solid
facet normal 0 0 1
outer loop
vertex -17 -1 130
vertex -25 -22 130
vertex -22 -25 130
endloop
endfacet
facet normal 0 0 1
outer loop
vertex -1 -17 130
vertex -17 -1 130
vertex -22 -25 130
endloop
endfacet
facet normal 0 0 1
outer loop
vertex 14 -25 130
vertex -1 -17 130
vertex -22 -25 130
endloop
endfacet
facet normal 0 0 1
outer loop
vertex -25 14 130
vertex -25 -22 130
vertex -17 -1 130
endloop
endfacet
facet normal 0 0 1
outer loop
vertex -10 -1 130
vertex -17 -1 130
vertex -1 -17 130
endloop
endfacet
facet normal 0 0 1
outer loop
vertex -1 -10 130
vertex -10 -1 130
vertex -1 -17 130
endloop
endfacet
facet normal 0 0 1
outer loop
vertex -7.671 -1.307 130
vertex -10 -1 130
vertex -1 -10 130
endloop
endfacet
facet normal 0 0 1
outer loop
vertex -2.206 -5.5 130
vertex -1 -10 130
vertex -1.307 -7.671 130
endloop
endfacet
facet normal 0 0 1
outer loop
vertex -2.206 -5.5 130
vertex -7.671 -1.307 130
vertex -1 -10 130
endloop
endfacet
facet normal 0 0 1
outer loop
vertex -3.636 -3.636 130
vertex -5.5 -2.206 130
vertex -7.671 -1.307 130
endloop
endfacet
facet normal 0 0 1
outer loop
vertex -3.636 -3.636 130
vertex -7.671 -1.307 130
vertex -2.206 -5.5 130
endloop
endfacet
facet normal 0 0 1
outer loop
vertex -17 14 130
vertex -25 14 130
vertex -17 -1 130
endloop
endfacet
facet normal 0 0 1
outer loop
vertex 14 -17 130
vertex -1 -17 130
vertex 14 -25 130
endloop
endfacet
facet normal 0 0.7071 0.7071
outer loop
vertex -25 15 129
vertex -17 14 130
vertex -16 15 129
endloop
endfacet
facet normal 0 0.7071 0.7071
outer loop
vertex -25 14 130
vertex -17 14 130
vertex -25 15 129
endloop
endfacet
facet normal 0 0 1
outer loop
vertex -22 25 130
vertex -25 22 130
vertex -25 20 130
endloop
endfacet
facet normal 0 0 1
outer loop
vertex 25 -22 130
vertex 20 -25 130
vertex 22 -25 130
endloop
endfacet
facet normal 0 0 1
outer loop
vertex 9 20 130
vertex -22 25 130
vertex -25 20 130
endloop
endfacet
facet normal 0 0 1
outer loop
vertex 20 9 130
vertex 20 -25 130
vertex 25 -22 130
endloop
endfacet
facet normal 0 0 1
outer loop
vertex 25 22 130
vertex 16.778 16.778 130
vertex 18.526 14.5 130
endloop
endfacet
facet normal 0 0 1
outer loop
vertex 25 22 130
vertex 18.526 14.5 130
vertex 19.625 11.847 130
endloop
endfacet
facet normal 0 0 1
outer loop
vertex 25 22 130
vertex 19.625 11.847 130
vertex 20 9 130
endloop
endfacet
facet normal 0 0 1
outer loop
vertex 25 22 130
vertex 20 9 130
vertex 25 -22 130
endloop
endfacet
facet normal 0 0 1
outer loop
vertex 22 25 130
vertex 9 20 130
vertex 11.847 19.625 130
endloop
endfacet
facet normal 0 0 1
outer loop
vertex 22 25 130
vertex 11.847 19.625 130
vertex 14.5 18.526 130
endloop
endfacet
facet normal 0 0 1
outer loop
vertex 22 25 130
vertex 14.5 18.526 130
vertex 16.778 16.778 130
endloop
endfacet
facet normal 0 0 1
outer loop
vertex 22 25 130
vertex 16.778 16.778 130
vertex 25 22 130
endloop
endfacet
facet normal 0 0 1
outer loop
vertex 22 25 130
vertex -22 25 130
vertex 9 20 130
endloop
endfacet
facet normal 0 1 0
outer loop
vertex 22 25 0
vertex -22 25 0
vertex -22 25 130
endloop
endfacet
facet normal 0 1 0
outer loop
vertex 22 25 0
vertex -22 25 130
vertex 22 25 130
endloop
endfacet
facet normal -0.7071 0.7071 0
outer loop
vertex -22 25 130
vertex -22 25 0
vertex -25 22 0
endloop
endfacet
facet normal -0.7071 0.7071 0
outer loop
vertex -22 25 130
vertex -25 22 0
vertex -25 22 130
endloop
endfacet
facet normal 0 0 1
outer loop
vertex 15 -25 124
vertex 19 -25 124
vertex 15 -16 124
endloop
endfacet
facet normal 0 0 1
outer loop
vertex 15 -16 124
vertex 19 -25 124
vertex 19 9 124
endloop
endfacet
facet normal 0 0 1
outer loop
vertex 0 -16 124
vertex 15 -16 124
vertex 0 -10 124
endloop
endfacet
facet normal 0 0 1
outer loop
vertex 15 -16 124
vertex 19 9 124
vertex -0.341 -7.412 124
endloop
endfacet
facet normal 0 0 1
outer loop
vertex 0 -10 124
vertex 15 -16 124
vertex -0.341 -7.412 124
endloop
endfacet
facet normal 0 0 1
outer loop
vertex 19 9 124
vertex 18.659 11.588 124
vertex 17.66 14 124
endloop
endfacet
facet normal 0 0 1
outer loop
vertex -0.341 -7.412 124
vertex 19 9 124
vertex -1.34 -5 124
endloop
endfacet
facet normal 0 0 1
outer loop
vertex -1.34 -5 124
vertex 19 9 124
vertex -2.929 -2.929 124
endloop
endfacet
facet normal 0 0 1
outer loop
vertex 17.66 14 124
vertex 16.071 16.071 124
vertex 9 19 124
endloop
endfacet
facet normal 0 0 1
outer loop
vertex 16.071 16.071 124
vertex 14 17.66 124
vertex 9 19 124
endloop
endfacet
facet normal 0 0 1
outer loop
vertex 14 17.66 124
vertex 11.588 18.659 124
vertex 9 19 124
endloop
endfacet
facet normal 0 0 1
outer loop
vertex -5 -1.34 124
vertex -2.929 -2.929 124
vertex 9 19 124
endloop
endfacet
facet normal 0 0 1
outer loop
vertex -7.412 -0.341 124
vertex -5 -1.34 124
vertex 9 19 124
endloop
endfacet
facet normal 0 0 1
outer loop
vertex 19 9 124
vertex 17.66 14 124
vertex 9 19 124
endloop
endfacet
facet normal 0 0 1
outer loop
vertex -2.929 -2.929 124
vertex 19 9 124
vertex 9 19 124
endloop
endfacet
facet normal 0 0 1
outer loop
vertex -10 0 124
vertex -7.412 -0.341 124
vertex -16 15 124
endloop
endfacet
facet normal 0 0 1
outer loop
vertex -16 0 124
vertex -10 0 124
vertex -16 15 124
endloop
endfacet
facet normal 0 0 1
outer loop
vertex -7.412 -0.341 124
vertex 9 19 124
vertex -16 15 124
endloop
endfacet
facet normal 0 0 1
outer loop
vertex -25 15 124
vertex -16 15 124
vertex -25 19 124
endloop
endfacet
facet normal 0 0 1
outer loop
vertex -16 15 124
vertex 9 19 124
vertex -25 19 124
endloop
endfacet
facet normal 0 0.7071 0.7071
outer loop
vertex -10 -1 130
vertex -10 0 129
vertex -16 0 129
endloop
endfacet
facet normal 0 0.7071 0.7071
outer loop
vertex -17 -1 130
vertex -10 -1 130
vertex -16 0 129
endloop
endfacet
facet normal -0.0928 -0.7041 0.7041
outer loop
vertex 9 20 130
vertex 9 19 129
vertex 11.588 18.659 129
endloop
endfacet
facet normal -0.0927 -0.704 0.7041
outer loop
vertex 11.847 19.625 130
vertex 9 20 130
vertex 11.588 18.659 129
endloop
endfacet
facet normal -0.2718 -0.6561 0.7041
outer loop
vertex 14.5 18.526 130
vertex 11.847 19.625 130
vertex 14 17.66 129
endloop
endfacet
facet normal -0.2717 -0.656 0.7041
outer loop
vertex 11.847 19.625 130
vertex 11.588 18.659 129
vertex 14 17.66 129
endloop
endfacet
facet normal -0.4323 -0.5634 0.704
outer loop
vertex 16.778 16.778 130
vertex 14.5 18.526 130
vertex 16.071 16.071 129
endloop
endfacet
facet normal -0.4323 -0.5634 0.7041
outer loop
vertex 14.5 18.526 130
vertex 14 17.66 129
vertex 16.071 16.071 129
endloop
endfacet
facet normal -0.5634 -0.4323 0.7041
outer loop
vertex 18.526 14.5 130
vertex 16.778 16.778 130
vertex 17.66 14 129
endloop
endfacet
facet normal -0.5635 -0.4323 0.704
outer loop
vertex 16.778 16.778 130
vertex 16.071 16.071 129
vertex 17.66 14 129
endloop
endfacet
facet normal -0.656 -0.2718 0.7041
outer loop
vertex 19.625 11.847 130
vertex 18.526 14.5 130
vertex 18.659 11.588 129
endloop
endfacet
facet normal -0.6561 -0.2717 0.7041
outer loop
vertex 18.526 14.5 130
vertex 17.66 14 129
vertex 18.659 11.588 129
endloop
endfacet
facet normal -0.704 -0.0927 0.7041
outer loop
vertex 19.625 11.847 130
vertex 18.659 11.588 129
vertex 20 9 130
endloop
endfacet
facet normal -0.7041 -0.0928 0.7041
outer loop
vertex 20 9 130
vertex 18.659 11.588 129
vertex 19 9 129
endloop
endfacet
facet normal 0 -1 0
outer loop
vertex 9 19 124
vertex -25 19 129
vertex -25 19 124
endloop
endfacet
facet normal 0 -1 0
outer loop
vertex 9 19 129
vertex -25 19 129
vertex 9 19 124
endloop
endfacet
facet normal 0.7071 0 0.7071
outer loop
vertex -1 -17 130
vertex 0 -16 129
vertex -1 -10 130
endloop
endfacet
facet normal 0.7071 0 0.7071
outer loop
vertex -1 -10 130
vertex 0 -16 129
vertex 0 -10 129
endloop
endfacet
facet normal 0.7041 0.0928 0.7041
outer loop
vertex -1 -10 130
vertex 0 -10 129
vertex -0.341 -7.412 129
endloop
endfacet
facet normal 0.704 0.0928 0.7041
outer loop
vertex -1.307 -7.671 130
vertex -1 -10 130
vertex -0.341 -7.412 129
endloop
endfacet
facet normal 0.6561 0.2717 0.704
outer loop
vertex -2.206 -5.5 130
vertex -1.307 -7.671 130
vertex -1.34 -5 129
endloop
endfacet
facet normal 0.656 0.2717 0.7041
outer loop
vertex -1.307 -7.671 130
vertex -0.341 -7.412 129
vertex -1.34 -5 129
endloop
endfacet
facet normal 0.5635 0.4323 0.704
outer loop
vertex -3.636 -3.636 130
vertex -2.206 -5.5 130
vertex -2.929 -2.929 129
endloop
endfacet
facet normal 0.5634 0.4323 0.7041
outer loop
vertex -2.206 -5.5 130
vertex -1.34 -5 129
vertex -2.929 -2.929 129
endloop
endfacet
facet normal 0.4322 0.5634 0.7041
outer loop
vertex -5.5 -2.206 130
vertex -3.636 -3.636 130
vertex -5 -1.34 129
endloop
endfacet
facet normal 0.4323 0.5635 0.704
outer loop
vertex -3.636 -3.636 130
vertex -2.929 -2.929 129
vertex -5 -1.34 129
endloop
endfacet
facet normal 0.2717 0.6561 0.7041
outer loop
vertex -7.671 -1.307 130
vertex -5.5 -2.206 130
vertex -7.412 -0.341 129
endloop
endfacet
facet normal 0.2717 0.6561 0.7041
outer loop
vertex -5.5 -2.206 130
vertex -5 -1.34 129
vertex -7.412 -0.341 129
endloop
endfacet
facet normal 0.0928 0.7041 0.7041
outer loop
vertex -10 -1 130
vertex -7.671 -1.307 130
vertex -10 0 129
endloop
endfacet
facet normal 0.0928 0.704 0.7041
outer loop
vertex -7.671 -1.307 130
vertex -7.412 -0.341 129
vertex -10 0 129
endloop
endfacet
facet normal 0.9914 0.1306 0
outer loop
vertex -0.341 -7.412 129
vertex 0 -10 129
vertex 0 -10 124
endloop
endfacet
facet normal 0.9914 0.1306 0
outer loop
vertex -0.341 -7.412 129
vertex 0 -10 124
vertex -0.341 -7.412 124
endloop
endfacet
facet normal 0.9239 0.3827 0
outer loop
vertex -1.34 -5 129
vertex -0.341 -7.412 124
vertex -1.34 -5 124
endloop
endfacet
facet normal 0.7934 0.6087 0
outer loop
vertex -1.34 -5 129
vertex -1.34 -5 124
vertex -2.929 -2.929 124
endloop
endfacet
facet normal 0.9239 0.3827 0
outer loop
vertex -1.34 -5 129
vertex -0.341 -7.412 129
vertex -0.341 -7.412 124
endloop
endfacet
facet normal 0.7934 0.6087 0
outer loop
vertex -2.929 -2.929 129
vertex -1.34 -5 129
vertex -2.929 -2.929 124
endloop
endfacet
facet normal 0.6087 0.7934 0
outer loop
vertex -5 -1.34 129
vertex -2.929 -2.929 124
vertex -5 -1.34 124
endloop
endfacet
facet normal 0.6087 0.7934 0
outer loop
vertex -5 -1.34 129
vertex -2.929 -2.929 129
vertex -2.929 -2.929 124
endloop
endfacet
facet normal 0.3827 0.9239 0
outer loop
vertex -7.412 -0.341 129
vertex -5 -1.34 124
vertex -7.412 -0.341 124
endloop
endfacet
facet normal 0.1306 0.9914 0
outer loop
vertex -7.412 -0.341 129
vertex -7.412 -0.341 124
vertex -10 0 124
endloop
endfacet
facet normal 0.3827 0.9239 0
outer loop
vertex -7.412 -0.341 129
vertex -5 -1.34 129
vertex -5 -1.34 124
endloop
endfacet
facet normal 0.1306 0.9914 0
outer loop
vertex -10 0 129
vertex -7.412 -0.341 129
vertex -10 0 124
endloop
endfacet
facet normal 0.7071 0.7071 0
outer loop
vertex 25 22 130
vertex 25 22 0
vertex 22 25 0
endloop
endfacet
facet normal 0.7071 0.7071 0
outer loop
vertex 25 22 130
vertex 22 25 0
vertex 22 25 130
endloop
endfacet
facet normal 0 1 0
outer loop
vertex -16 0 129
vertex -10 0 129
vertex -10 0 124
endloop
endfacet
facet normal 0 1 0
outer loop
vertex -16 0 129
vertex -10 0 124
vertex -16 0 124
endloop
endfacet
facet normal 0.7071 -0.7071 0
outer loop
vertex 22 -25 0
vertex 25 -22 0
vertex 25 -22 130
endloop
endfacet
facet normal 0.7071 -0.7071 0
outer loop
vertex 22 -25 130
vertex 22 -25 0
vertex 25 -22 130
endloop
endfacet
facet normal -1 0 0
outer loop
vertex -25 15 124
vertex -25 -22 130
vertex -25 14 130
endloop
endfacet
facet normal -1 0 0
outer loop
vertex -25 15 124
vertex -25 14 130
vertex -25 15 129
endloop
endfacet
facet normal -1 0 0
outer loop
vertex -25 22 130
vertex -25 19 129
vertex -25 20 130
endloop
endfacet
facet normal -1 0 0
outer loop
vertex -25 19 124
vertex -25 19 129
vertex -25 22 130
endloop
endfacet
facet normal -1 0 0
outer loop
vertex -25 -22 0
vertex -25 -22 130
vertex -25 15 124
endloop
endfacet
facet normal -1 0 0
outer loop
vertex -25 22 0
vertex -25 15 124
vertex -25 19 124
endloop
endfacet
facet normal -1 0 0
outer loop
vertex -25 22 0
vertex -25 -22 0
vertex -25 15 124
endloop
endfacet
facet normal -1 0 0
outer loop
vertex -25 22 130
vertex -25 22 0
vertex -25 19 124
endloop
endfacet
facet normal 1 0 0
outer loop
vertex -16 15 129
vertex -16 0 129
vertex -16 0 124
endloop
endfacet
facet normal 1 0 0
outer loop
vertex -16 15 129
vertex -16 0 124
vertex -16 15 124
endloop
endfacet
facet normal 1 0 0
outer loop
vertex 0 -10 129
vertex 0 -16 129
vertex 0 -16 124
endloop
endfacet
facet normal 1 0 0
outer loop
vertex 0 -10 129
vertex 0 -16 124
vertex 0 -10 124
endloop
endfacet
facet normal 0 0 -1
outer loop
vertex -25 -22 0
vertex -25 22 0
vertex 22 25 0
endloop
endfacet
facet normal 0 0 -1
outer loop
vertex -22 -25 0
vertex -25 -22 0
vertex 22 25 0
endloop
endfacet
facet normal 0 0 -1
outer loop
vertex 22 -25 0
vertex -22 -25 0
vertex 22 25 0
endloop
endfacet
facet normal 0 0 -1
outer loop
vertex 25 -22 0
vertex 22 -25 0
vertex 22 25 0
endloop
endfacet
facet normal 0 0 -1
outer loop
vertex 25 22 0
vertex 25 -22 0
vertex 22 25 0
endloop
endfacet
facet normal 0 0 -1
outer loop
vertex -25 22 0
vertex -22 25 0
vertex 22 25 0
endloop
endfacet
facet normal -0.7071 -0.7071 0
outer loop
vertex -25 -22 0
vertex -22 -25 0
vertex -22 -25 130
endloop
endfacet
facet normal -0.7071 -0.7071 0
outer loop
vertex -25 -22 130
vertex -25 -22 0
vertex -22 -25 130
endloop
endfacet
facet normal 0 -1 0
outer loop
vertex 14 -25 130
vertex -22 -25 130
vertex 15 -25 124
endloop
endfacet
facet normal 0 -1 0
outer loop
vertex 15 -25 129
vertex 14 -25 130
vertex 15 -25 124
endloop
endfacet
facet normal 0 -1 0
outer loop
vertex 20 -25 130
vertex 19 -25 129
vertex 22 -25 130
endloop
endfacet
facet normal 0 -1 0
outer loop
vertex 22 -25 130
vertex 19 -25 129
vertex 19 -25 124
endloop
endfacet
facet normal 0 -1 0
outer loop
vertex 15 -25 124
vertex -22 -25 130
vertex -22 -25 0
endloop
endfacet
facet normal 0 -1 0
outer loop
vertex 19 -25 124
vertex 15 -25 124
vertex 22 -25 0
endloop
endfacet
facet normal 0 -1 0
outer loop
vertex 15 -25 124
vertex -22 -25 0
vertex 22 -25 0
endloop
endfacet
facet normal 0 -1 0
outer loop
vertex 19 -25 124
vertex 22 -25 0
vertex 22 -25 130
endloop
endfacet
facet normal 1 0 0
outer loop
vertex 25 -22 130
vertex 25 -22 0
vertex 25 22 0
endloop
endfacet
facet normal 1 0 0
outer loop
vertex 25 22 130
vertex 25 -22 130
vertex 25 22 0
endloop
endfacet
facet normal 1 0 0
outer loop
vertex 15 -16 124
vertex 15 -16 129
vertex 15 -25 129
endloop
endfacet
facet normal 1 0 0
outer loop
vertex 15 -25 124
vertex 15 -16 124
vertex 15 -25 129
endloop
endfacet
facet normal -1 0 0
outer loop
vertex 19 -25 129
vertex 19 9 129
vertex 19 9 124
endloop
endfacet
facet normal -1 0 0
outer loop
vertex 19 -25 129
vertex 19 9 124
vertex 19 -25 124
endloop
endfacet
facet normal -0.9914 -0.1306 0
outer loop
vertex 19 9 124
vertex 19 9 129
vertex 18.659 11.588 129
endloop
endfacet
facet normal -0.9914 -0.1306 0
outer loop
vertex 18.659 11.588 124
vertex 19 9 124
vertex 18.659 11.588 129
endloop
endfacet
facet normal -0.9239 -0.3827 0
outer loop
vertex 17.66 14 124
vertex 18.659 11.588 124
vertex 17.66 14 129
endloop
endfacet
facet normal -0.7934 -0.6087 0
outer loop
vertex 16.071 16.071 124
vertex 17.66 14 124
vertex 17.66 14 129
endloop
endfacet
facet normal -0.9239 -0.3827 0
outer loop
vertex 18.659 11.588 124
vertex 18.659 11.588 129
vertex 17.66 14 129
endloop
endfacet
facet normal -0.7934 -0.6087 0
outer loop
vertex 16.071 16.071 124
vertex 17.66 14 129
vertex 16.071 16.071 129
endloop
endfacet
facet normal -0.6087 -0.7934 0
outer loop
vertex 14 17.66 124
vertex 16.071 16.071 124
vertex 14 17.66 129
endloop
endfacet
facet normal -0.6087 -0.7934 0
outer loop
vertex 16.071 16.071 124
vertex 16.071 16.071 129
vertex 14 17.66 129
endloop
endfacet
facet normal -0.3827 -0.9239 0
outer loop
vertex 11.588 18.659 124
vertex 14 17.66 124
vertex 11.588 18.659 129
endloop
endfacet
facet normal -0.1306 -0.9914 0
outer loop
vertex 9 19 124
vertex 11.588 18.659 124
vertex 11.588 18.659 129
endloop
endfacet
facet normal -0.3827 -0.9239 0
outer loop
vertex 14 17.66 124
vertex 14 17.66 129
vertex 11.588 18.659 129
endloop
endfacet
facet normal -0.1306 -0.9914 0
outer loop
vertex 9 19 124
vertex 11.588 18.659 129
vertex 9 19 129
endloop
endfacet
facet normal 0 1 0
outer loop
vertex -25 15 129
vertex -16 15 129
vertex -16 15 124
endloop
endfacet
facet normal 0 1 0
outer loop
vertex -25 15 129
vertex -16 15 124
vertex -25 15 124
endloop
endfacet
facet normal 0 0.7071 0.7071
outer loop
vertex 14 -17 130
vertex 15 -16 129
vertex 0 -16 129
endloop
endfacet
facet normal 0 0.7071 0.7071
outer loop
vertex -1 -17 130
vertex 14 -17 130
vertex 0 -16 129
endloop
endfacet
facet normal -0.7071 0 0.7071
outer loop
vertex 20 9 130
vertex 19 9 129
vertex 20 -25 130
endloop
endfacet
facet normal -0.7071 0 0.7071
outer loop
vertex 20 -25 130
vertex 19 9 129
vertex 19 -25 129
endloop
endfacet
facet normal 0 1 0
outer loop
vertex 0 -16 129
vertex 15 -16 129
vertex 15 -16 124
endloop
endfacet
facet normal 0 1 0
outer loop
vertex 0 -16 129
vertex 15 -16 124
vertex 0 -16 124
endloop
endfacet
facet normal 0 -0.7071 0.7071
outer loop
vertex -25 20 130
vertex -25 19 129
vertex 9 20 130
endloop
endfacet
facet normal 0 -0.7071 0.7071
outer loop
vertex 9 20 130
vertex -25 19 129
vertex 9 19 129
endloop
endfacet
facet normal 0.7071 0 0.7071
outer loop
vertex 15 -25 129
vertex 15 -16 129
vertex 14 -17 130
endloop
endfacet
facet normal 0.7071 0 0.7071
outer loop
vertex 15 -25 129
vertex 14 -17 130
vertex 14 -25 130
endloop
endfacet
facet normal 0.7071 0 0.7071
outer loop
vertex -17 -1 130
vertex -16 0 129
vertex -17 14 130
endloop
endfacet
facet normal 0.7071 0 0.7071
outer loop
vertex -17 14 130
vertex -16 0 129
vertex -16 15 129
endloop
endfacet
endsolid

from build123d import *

# Parameters (mm, degrees)
SKETCH029_W     = 50
SKETCH029_H     = 50
PAD017_DEPTH    = 130
POCKET007_DEPTH = 6
CHAMFER006_SIZE = 1
CHAMFER007_SIZE = 3


with BuildPart() as part:
    # Sketch029 → Pad017 (new body)
    with BuildSketch(Plane.XY):
        Rectangle(SKETCH029_W, SKETCH029_H)
    extrude(amount=PAD017_DEPTH)

    # Sketch030 (on DatumPlane) → Pocket007 (cut)
    with BuildSketch(Plane.XY.offset(130)):
        with BuildLine():
            Line((-31, 19), (9, 19))
            ThreePointArc((19, 9), (16.071068, 16.071068), (9, 19))
            Line((19, 9), (19, -31))
            Line((15, -31), (19, -31))
            Line((15, -16), (15, -31))
            Line((15, -16), (0, -16))
            Line((0, -16), (0, -10))
            ThreePointArc((0, -10), (-2.928932, -2.928932), (-10, 0))
            Line((-10, 0), (-16, 0))
            Line((-16, 0), (-16, 15))
            Line((-16, 15), (-31, 15))
            Line((-31, 15), (-31, 19))
        make_face()
    extrude(amount=-POCKET007_DEPTH, mode=Mode.SUBTRACT)

    # Chamfer006
    chamfer006_edges = [part.edges().sort_by_distance(p)[0] for p in [
        (19, -8, 130),
        (-16, 7.5, 130),
        (-13, 0, 130),
        (7.5, -16, 130),
        (15, -20.5, 130),
        (-20.5, 15, 130),
    ]]
    chamfer(chamfer006_edges, length=CHAMFER006_SIZE)

    # Chamfer007
    chamfer007_edges = [part.edges().sort_by_distance(p)[0] for p in [
        (25, -25, 65),
        (-25, -25, 65),
        (25, 25, 65),
        (-25, 25, 65),
    ]]
    chamfer(chamfer007_edges, length=CHAMFER007_SIZE)


solid = part.part
